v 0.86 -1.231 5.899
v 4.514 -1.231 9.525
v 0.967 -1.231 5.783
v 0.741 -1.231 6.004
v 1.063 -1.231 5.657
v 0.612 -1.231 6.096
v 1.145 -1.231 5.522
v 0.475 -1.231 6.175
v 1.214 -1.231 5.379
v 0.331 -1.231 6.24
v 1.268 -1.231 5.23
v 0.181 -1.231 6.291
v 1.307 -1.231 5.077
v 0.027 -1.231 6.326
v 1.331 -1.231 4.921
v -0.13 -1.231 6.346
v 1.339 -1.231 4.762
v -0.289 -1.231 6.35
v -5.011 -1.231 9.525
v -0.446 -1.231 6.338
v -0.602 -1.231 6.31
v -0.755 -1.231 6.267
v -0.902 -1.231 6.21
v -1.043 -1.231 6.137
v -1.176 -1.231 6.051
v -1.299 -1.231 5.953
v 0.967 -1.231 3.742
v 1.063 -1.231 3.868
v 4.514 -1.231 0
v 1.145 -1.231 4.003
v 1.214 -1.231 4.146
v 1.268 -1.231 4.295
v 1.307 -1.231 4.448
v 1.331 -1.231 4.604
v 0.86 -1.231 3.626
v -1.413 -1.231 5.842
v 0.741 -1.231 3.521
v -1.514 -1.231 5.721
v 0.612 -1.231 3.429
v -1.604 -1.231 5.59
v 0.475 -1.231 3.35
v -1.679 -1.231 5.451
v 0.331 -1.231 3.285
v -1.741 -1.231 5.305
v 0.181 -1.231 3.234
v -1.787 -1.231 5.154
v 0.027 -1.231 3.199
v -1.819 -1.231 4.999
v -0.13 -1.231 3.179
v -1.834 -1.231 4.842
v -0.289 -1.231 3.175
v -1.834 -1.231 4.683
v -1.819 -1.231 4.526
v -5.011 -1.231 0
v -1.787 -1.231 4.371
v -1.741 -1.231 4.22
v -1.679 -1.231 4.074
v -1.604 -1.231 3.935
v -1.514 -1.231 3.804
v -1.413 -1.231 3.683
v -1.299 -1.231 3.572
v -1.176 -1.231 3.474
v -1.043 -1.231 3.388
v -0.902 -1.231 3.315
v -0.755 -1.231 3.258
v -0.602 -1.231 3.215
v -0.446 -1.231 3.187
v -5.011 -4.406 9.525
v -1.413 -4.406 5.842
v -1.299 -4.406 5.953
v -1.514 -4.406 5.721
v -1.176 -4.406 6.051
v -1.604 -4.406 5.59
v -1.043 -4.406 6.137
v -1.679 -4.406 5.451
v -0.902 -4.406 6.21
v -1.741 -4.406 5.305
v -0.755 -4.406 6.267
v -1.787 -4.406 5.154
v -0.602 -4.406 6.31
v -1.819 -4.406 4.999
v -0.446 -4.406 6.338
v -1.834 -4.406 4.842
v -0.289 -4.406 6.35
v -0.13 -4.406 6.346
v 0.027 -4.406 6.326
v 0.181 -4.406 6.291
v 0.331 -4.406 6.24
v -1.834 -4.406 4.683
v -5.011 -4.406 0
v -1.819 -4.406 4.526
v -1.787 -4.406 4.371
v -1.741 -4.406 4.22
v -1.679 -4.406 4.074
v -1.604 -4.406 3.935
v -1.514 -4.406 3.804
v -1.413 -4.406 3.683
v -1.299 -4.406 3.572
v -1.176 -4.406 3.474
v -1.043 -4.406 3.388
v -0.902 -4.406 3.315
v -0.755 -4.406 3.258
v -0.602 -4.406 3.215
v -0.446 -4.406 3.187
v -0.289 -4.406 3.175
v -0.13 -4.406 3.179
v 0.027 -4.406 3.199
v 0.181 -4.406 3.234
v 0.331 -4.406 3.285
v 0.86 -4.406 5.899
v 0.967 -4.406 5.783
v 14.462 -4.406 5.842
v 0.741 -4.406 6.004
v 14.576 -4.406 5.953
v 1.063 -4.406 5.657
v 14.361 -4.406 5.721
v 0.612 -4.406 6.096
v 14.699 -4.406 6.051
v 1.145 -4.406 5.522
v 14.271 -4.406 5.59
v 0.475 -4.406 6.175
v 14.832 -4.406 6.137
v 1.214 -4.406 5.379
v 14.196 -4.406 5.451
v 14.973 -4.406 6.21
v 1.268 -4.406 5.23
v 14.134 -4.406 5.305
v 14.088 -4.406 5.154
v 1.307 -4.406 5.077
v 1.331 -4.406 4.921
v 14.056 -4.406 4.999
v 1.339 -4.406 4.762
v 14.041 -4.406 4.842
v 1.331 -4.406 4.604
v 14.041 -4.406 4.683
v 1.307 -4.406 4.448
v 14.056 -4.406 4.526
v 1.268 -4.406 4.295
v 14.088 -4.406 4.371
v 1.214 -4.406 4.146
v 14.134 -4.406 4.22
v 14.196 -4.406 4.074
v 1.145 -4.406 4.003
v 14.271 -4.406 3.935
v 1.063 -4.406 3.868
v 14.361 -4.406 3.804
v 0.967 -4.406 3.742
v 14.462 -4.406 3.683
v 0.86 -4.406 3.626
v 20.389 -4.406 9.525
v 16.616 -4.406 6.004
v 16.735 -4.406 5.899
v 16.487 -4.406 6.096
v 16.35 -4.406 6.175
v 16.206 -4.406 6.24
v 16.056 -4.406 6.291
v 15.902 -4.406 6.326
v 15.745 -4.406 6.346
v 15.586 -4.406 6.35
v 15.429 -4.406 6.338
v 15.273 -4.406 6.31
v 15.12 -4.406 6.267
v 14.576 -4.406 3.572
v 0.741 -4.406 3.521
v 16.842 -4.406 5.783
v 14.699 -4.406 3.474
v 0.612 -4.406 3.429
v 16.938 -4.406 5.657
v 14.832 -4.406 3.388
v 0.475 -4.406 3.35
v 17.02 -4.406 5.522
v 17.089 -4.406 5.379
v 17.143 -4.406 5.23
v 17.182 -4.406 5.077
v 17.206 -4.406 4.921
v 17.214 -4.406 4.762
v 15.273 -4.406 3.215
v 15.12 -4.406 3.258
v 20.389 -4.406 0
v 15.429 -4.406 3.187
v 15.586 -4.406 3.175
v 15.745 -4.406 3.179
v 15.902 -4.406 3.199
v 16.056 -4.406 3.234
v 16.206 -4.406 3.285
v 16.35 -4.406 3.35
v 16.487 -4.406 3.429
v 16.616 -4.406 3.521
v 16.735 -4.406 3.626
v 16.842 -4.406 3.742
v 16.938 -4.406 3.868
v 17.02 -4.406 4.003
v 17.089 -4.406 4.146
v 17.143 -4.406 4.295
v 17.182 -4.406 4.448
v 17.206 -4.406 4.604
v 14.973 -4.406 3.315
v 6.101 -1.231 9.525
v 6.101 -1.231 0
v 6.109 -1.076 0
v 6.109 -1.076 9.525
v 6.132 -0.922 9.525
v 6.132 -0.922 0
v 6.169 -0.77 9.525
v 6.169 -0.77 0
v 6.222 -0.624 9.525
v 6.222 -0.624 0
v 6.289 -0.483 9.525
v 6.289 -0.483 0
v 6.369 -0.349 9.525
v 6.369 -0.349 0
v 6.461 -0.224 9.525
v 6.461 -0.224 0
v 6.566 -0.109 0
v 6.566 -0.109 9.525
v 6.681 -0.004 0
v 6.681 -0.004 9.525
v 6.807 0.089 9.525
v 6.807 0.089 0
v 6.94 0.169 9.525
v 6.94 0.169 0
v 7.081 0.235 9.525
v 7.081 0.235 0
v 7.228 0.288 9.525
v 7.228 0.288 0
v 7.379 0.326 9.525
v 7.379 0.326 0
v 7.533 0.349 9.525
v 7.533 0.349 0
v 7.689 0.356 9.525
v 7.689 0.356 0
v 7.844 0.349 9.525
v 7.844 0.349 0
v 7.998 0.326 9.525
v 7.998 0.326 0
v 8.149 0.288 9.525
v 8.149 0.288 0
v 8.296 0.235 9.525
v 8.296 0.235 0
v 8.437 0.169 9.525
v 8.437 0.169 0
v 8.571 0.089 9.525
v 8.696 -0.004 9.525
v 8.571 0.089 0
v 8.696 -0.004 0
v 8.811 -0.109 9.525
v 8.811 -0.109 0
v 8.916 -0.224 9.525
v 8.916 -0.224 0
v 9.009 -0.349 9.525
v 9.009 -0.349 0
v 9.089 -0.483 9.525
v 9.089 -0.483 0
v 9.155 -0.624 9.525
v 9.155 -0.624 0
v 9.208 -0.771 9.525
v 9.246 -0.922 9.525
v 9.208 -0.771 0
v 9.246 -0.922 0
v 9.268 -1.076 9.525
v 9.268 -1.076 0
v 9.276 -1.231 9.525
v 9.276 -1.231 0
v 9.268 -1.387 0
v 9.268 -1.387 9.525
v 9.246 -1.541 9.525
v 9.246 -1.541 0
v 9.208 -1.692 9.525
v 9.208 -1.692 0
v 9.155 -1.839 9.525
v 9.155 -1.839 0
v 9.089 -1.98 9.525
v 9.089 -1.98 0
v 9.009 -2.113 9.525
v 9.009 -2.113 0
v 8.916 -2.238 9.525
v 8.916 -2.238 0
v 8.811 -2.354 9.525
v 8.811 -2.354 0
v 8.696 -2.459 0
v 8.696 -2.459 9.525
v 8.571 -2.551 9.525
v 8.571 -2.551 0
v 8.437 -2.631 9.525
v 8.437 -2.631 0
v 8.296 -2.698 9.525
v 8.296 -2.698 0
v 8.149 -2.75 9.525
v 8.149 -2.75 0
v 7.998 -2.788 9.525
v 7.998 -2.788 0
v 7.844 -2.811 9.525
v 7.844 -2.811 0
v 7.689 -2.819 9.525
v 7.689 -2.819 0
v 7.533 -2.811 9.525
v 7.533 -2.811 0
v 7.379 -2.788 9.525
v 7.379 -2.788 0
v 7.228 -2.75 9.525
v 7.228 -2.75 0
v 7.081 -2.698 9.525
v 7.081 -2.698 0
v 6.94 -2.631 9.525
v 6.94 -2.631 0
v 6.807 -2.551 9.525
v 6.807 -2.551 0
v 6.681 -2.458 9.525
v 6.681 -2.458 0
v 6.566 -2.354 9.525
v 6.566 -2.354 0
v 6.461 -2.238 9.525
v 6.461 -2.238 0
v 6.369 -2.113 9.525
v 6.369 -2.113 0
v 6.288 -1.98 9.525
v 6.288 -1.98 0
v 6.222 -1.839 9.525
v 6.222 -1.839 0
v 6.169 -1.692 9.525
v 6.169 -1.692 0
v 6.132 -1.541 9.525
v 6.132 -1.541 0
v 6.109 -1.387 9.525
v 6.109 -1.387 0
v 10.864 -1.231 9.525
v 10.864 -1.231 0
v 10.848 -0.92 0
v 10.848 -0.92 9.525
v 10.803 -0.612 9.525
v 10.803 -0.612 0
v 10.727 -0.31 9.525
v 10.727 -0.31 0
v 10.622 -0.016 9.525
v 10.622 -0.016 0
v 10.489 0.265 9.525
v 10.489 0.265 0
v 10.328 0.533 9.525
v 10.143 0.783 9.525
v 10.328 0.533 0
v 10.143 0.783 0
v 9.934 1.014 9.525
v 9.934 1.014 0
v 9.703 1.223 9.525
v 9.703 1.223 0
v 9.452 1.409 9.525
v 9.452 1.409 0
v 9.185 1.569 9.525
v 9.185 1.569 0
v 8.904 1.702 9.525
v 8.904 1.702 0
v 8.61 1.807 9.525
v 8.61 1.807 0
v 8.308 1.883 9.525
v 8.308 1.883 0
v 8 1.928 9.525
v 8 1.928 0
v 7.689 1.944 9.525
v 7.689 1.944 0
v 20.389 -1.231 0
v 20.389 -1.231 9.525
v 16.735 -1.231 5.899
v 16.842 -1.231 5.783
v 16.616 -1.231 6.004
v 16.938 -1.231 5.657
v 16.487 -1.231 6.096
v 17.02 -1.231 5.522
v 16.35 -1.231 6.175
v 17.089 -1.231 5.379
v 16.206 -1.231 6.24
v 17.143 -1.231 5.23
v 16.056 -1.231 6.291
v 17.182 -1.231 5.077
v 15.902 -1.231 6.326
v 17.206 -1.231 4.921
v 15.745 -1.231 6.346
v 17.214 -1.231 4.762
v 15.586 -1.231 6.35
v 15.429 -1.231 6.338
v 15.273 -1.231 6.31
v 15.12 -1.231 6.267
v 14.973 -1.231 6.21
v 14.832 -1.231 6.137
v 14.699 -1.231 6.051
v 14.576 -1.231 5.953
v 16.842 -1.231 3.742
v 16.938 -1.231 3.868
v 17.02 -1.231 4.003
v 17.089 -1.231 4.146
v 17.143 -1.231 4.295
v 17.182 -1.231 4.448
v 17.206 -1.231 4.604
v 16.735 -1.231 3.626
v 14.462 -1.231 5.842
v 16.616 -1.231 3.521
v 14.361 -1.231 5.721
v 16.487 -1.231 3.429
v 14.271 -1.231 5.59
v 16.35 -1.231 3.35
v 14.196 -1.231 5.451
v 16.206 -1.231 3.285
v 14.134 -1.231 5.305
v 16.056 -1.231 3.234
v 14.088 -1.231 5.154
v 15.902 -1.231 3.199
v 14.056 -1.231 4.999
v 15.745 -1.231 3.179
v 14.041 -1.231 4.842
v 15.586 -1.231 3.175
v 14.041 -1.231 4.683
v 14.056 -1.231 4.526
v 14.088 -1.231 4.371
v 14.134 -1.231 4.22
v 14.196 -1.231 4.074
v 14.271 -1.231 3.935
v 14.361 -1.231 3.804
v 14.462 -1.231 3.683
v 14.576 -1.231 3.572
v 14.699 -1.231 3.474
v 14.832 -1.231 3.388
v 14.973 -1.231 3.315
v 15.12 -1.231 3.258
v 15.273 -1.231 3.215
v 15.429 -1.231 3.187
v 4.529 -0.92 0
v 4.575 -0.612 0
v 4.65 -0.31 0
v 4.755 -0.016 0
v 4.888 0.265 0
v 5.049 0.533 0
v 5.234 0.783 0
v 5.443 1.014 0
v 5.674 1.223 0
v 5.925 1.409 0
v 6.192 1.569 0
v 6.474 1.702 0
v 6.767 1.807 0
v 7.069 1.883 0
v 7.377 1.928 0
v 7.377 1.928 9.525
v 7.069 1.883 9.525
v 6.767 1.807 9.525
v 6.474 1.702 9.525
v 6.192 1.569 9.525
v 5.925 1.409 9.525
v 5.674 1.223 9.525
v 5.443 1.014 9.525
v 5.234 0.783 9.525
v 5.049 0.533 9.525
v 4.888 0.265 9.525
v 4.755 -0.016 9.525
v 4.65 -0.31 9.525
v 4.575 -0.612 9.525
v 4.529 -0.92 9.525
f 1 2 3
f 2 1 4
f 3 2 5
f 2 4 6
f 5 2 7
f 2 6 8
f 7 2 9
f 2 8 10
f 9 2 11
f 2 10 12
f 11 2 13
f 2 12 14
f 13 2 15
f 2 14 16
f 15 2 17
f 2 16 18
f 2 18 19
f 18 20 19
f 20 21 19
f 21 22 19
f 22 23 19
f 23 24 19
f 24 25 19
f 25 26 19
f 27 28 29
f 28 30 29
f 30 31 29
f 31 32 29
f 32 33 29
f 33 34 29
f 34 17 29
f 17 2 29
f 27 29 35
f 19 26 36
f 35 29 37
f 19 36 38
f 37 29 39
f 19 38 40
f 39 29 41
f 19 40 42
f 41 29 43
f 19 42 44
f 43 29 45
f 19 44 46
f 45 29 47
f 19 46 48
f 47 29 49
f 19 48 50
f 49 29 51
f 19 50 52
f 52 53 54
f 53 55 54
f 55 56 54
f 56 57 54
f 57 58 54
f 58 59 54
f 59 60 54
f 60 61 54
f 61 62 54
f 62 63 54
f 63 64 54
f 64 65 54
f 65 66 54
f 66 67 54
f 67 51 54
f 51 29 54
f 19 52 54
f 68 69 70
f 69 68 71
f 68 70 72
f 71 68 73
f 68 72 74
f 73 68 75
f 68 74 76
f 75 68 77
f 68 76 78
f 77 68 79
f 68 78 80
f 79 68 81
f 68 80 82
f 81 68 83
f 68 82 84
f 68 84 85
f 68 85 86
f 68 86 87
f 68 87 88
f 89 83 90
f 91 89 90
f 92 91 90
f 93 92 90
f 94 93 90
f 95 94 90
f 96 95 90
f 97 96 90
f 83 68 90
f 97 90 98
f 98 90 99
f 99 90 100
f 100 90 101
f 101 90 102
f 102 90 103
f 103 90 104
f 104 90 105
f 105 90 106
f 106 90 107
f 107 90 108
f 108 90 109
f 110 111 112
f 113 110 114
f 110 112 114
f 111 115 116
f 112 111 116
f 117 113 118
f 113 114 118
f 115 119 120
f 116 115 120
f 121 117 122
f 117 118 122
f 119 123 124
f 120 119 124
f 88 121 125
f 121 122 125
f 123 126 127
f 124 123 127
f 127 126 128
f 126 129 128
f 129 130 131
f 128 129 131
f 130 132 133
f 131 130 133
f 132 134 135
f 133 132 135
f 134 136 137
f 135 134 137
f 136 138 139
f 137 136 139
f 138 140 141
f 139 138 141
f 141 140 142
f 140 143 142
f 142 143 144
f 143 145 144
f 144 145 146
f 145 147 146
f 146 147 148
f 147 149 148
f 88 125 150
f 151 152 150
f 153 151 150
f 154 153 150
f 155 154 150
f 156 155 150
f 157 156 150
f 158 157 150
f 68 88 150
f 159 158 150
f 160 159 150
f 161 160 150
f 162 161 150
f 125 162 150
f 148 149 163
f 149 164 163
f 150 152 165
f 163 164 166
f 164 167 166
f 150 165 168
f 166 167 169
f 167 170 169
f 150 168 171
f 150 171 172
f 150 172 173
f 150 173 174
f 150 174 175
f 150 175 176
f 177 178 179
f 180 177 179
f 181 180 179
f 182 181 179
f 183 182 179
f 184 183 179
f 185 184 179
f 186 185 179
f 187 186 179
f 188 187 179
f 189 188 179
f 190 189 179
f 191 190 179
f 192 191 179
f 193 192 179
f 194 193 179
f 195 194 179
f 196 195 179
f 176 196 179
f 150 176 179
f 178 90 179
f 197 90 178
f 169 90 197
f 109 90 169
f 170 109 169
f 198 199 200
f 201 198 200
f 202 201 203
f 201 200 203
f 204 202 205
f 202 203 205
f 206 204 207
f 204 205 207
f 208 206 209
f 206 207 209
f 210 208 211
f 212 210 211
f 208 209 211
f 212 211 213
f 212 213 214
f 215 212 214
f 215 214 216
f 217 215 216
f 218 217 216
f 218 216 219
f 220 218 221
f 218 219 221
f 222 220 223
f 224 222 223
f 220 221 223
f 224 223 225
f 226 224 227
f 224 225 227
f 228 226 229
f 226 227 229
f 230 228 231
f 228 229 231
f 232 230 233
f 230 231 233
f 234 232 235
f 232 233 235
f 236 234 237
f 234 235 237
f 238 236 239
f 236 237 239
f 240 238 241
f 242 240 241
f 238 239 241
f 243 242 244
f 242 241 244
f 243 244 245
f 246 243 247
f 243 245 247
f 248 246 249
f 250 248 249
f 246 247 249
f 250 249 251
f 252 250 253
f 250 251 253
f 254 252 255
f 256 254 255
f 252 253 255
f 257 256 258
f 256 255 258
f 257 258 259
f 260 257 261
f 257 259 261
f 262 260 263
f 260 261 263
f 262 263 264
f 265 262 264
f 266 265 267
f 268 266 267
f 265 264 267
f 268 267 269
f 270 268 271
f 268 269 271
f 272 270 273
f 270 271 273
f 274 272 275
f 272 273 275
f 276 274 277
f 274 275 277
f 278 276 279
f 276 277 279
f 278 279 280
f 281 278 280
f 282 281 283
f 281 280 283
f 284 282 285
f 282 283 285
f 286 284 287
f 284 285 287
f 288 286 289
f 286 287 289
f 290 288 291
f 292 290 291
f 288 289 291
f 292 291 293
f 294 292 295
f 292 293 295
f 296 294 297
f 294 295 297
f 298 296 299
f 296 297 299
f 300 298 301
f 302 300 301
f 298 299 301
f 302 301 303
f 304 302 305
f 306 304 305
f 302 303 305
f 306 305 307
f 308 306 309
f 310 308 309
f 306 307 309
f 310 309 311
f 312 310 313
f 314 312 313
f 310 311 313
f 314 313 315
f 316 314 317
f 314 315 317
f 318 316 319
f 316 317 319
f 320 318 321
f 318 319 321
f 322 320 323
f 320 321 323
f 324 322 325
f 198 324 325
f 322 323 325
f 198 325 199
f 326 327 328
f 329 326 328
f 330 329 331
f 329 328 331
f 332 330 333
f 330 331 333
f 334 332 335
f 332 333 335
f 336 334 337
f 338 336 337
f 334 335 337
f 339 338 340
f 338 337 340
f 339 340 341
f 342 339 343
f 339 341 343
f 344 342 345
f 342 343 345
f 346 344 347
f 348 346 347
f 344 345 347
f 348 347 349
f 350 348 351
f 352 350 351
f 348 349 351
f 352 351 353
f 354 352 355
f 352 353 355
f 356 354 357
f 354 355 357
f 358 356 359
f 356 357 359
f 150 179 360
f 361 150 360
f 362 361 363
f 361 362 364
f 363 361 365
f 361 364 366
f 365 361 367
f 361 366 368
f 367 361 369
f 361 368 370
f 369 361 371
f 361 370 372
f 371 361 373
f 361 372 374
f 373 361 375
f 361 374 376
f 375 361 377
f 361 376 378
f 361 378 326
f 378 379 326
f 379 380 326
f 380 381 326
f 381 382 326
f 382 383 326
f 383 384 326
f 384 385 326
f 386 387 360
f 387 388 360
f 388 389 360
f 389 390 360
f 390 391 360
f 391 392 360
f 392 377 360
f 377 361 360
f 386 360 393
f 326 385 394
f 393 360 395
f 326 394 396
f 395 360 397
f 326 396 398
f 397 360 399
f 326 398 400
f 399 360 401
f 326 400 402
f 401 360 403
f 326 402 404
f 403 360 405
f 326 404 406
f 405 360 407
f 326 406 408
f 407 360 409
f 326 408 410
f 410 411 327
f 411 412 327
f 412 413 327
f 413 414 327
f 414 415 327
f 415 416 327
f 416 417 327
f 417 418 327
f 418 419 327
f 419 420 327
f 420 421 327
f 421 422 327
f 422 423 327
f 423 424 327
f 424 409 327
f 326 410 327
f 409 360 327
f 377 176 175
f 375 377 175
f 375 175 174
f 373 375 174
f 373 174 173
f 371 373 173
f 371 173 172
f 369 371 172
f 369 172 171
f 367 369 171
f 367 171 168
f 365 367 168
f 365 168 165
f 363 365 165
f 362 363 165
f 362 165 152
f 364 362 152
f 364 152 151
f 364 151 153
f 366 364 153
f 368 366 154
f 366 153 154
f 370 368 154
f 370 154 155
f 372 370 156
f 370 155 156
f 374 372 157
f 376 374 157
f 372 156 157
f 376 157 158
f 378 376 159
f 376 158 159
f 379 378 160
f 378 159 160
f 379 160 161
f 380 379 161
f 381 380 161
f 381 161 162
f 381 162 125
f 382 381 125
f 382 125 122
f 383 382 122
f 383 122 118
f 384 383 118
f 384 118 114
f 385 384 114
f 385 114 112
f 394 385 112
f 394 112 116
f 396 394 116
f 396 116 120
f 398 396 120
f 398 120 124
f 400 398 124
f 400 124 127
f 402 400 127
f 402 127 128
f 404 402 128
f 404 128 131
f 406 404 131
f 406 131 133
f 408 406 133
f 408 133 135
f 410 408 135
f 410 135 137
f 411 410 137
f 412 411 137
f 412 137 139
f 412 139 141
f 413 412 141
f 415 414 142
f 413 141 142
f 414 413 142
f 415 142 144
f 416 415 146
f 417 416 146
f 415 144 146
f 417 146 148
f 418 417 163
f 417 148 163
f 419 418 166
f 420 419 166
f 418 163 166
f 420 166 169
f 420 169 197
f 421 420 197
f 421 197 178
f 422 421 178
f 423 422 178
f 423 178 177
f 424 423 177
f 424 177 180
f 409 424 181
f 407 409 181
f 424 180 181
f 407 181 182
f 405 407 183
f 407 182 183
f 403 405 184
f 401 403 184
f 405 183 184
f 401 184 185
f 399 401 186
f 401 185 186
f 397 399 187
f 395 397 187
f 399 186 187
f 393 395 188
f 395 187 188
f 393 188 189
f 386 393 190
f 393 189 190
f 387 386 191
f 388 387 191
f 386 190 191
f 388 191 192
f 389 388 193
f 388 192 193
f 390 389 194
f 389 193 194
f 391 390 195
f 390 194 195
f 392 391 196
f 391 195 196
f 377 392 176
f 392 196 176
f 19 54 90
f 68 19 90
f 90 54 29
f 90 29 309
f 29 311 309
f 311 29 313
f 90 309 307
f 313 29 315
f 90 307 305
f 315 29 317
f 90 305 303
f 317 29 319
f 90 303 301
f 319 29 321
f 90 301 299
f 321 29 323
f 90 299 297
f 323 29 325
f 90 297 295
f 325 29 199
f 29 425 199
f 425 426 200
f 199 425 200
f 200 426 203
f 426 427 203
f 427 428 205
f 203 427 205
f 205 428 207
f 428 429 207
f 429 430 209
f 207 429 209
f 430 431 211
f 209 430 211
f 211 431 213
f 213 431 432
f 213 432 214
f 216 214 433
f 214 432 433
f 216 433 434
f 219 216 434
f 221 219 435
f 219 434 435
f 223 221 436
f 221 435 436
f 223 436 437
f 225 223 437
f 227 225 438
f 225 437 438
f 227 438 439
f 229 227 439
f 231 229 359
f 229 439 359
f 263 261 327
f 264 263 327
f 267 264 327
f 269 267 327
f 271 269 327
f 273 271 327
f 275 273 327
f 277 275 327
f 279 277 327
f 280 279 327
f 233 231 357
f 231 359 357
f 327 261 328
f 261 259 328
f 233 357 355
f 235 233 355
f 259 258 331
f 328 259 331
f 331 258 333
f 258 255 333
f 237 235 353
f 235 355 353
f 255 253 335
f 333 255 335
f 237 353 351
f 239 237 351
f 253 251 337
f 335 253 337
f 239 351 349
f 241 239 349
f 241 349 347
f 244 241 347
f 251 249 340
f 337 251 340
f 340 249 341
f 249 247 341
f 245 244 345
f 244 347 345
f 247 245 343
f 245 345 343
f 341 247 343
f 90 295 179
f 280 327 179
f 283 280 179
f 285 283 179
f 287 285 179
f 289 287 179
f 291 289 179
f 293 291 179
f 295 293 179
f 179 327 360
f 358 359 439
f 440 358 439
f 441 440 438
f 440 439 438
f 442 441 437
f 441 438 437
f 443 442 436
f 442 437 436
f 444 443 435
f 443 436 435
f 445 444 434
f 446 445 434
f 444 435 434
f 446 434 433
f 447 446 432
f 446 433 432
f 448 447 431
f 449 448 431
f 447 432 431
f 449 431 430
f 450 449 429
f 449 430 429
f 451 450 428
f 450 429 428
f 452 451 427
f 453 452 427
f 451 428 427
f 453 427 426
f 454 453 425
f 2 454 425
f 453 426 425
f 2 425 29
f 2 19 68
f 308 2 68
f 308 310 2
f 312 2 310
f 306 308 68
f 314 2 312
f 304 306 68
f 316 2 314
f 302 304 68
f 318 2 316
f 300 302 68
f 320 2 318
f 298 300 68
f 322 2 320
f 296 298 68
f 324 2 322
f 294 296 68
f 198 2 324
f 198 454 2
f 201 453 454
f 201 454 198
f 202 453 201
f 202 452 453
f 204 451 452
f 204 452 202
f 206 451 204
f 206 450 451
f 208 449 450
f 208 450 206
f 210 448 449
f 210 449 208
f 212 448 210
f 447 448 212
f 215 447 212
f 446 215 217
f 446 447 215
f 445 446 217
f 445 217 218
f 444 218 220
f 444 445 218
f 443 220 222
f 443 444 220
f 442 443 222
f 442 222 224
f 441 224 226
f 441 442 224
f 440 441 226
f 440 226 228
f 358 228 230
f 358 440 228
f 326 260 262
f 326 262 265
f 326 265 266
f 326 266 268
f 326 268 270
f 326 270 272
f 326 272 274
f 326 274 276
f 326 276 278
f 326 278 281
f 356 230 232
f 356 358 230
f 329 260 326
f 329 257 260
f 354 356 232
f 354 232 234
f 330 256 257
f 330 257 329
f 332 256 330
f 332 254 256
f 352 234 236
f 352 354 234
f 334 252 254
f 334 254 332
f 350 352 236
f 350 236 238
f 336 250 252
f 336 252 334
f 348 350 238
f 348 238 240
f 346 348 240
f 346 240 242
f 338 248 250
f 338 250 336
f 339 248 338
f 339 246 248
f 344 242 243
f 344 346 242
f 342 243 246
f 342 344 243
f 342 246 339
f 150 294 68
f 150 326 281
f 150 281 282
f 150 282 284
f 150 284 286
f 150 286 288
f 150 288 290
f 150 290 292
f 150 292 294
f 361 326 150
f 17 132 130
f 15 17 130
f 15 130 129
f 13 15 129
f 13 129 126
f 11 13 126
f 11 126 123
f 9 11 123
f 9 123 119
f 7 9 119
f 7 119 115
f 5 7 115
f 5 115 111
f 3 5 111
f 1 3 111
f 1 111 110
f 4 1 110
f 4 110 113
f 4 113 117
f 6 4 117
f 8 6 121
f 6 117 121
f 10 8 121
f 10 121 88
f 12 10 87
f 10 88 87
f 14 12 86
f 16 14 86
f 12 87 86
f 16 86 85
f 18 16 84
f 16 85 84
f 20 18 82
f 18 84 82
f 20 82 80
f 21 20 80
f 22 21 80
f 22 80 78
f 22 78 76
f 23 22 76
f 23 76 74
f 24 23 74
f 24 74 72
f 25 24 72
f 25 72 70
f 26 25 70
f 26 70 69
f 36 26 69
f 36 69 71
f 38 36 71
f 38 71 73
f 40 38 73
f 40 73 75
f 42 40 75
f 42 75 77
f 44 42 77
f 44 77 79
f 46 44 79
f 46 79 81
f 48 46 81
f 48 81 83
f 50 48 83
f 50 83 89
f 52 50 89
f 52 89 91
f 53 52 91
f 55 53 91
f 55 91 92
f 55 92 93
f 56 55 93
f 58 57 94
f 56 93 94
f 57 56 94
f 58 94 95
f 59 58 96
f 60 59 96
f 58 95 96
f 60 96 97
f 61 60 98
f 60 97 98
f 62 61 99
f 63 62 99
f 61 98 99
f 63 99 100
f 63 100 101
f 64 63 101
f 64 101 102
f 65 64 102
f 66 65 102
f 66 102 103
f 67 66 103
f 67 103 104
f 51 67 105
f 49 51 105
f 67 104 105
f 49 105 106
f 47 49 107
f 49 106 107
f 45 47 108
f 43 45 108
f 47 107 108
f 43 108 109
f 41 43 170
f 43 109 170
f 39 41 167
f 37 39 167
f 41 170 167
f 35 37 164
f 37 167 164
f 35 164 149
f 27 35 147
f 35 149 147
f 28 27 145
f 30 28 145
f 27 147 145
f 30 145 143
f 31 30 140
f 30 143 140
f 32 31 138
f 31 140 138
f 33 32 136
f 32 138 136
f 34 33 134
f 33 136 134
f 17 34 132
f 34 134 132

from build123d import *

# Parameters (mm, degrees)
F1_DEPTH = 9.525
F3_D     = 3.175
F5_D     = 3.175


# Not quite as in the source:
# - ends of sketch curves that miss each other by under 0.0002 mm in the source are joined
# - a length typed as a fraction of an inch, garbled in the dataset ("3 / 203.2 mm" for 3/8 in), is restored


with BuildPart() as f1:
    # F0 (on Top) → F1 (new body)
    with BuildSketch(Plane.XY):
        with BuildLine():
            ThreePointArc((7.6885502785, 1.9437116954), (5.4434862483, 1.0137757257), (4.5135502785, -1.2312883046))
            Line((4.5135502785, -1.2312883046), (6.1010502795, -1.2312883046))
            ThreePointArc((6.1010502795, -1.2312883046), (7.6885771705, 0.3561579113), (9.2760502785, -1.2313420884))
            Line((9.2760502785, -1.2313420884), (10.8635502785, -1.2312883046))
            ThreePointArc((10.8635502785, -1.2312883046), (9.9336143088, 1.0137757257), (7.6885502785, 1.9437116954))
        make_face()
        with BuildLine():
            Line((-5.0114497215, -1.2312883046), (-5.0114497215, -4.4062883046))
            Line((-5.0114497215, -4.4062883046), (20.3885502785, -4.4062883046))
            Line((20.3885502785, -4.4062883046), (20.3885502785, -1.2312883046))
            Line((20.3885502785, -1.2312883046), (10.8635502785, -1.2312883046))
            Line((10.8635502785, -1.2312883046), (9.2760502785, -1.2312883046))
            ThreePointArc((9.2760502785, -1.2312883046), (7.6885233866, -2.8188420882), (6.1010502795, -1.2312883046))
            Line((6.1010502795, -1.2312883046), (4.5135502785, -1.2312883046))
            Line((4.5135502785, -1.2312883046), (-5.0114497215, -1.2312883046))
        make_face()
    extrude(amount=F1_DEPTH)

    # F3 (through all)
    with Locations(Plane(origin=(0, -1.2312883046, 0), x_dir=(-1, 0, 0), z_dir=(0, 1, 0))):
        with Locations((-15.6260502785, 4.7625)):
            Hole(F3_D / 2)

    # F5 (through all)
    with Locations(Plane(origin=(0, -1.2312883046, 0), x_dir=(-1, 0, 0), z_dir=(0, 1, 0))):
        with Locations((0.2489497215, 4.7625)):
            Hole(F5_D / 2)


solid = f1.part
